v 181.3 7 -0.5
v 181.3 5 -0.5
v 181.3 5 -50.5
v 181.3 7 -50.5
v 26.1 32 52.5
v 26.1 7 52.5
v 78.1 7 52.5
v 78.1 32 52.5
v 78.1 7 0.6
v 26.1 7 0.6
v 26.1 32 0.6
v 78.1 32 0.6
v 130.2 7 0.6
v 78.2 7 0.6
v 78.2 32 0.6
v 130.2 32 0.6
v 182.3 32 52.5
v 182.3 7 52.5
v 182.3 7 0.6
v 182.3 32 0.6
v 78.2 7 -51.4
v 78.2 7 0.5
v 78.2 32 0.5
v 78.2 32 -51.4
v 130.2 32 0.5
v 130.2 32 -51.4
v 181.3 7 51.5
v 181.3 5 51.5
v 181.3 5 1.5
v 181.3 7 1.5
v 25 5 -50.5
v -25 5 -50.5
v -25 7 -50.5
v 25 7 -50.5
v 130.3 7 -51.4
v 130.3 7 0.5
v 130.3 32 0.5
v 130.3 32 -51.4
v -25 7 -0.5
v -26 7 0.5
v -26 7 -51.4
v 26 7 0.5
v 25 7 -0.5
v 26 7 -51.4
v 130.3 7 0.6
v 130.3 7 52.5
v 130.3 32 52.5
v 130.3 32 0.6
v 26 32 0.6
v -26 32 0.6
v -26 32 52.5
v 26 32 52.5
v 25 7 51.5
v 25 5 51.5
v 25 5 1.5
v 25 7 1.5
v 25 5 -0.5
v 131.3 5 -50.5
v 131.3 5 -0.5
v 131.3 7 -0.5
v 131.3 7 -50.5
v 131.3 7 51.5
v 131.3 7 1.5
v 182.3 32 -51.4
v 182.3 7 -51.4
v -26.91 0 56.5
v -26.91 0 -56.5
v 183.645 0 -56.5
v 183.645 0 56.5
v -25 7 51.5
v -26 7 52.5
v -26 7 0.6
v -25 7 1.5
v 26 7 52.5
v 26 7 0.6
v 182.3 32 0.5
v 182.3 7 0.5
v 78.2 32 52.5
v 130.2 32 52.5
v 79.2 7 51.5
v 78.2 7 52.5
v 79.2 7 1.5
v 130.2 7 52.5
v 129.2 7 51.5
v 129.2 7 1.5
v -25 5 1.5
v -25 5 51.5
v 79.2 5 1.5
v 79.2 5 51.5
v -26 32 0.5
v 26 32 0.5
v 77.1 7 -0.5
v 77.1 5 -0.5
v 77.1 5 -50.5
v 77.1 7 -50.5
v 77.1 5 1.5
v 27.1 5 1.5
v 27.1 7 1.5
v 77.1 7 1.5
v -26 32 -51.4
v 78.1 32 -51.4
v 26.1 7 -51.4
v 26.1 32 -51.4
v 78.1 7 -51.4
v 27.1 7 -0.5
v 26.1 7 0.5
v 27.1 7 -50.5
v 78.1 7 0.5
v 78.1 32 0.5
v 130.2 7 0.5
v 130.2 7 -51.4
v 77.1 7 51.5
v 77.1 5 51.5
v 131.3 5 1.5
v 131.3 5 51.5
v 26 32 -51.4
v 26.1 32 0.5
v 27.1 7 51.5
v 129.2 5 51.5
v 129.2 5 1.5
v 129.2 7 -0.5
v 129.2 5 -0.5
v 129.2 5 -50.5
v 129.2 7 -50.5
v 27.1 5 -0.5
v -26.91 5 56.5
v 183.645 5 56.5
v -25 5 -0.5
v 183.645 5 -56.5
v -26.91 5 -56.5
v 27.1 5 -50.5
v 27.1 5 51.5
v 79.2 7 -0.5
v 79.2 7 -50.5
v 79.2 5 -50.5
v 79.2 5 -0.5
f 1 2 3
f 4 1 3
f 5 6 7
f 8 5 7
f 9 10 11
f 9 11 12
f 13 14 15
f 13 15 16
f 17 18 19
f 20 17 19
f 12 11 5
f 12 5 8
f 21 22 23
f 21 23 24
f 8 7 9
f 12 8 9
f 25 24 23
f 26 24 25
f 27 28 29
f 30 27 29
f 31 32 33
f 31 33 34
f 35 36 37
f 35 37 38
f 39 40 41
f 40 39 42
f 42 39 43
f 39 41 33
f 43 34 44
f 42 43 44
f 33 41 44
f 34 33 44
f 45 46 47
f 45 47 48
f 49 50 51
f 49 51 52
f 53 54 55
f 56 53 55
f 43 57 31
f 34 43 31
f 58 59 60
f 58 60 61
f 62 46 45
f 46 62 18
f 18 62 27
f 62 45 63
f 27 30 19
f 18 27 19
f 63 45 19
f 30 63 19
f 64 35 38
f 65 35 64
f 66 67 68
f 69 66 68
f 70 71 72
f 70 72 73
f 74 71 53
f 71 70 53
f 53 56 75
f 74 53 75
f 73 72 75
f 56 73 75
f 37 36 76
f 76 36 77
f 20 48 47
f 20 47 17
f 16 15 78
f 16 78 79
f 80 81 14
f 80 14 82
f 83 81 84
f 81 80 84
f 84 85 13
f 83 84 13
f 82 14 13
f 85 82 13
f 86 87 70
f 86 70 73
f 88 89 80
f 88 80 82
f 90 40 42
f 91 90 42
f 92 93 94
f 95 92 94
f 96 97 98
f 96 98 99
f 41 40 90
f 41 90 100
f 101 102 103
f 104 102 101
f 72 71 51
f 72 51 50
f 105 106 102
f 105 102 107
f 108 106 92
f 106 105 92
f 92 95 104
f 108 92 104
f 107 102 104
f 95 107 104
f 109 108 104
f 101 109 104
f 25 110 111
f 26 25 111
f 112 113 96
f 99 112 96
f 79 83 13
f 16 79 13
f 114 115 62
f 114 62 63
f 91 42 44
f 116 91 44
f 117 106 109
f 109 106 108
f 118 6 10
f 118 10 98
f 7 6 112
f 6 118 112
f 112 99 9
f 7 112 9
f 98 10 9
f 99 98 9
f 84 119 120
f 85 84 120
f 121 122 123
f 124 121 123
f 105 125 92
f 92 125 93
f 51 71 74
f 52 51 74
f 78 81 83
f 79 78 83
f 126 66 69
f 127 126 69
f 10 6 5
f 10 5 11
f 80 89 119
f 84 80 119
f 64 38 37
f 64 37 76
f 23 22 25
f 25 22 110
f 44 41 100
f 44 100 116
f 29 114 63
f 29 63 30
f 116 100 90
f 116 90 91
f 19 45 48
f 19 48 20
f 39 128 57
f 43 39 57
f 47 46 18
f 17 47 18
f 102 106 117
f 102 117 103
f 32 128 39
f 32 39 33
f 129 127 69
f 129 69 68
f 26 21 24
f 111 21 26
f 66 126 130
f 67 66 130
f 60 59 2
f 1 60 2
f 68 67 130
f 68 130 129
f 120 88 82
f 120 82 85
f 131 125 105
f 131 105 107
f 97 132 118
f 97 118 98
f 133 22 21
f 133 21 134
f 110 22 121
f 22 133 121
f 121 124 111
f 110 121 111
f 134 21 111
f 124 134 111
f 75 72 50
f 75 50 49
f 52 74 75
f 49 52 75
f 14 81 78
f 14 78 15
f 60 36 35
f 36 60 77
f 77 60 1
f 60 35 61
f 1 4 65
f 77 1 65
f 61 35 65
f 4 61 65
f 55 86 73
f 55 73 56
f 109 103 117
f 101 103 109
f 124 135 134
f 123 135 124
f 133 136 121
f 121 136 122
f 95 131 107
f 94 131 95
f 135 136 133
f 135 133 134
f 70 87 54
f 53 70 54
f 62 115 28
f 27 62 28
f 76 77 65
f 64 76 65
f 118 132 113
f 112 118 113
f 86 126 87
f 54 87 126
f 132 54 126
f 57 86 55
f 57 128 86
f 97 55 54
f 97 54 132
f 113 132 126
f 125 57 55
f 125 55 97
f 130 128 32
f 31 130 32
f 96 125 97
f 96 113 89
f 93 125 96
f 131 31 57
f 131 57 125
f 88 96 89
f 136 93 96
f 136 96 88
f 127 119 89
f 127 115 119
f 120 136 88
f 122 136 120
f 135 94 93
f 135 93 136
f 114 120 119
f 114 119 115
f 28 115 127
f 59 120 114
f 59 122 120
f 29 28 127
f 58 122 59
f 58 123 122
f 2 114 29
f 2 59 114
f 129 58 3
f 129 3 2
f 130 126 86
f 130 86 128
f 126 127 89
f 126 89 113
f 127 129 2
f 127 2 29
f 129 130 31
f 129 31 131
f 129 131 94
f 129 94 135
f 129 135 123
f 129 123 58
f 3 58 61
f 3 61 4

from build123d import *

# Parameters (mm, degrees)
SKETCH1_W                 = 500
SKETCH1_H                 = 113
BOSS_EXTRUDE1_DEPTH       = 5
SKETCH2_W                 = 50
SKETCH2_H                 = 50
BOSS_EXTRUDE3_DEPTH       = 2
LPATTERN1_COUNT           = 2
LPATTERN1_PITCH           = 52
SKETCH3_W                 = 52
SKETCH3_H                 = 51.9
BOSS_EXTRUDE8_DEPTH       = 25
LPATTERN5_COUNT           = 2
LPATTERN5_PITCH           = 52
LPATTERN6_COUNT           = 4
LPATTERN6_PITCH           = 52.1
LPATTERN6_COPY_1_SKETCH_W = 50
LPATTERN6_COPY_1_SKETCH_H = 50
LPATTERN6_COPY_1_DEPTH    = 2
LPATTERN6_COPY_2_SKETCH_W = 50
LPATTERN6_COPY_2_SKETCH_H = 50
LPATTERN6_COPY_2_DEPTH    = 2
LPATTERN6_COPY_3_SKETCH_W = 50
LPATTERN6_COPY_3_SKETCH_H = 50
LPATTERN6_COPY_3_DEPTH    = 2
LPATTERN6_COPY_4_SKETCH_W = 52
LPATTERN6_COPY_4_SKETCH_H = 51.9
LPATTERN6_COPY_4_DEPTH    = 25
LPATTERN6_COPY_5_SKETCH_W = 52
LPATTERN6_COPY_5_SKETCH_H = 51.9
LPATTERN6_COPY_5_DEPTH    = 25
LPATTERN6_COPY_6_SKETCH_W = 52
LPATTERN6_COPY_6_SKETCH_H = 51.9
LPATTERN6_COPY_6_DEPTH    = 25
SKETCH4_W                 = 223.089941366
SKETCH4_H                 = 113
SKETCH4_W_2               = 66.355147464
CUT_EXTRUDE1_DEPTH        = 10


with BuildPart() as part:
    # Sketch1 → Boss-Extrude1 (new body)
    with BuildSketch(Plane(origin=(0, 0, 0), x_dir=(1, 0, 0), z_dir=(0, 1, 0))):
        Rectangle(SKETCH1_W, SKETCH1_H)
    extrude(amount=BOSS_EXTRUDE1_DEPTH)

    # Sketch2 → Boss-Extrude3 (add)
    with BuildSketch(Plane(origin=(0, 5, 0), x_dir=(1, 0, 0), z_dir=(0, 1, 0))):
        with Locations((0, -26.5)):
            Rectangle(SKETCH2_W, SKETCH2_H)
    boss_extrude3 = extrude(amount=BOSS_EXTRUDE3_DEPTH)

    # LPattern1: Boss-Extrude3 ×2
    with Locations(*[(0, 0, -i * LPATTERN1_PITCH) for i in range(1, LPATTERN1_COUNT)]):
        add(boss_extrude3)

    # Sketch3 → Boss-Extrude8 (add)
    with BuildSketch(Plane(origin=(0, 7, 0), x_dir=(1, 0, 0), z_dir=(0, 1, 0))):
        with Locations((0, -26.55)):
            Rectangle(SKETCH3_W, SKETCH3_H)
    boss_extrude8 = extrude(amount=BOSS_EXTRUDE8_DEPTH)

    # LPattern5: Boss-Extrude8 ×2
    with Locations(*[(0, 0, -i * LPATTERN5_PITCH) for i in range(1, LPATTERN5_COUNT)]):
        add(boss_extrude8)

    # LPattern6: Boss-Extrude3, Boss-Extrude8 ×4
    with Locations(*[(i * LPATTERN6_PITCH, 0, 0) for i in range(1, LPATTERN6_COUNT)]):
        add(boss_extrude3)
        add(boss_extrude8)

    # LPattern6 copy 1 sketch → LPattern6 copy 1 (add)
    with BuildSketch(Plane(origin=(52.1, 5, -52), x_dir=(1, 0, 0), z_dir=(0, 1, 0))):
        with Locations((0, -26.5)):
            Rectangle(LPATTERN6_COPY_1_SKETCH_W, LPATTERN6_COPY_1_SKETCH_H)
    extrude(amount=LPATTERN6_COPY_1_DEPTH)

    # LPattern6 copy 2 sketch → LPattern6 copy 2 (add)
    with BuildSketch(Plane(origin=(104.2, 5, -52), x_dir=(1, 0, 0), z_dir=(0, 1, 0))):
        with Locations((0, -26.5)):
            Rectangle(LPATTERN6_COPY_2_SKETCH_W, LPATTERN6_COPY_2_SKETCH_H)
    extrude(amount=LPATTERN6_COPY_2_DEPTH)

    # LPattern6 copy 3 sketch → LPattern6 copy 3 (add)
    with BuildSketch(Plane(origin=(156.3, 5, -52), x_dir=(1, 0, 0), z_dir=(0, 1, 0))):
        with Locations((0, -26.5)):
            Rectangle(LPATTERN6_COPY_3_SKETCH_W, LPATTERN6_COPY_3_SKETCH_H)
    extrude(amount=LPATTERN6_COPY_3_DEPTH)

    # LPattern6 copy 4 sketch → LPattern6 copy 4 (add)
    with BuildSketch(Plane(origin=(52.1, 7, -52), x_dir=(1, 0, 0), z_dir=(0, 1, 0))):
        with Locations((0, -26.55)):
            Rectangle(LPATTERN6_COPY_4_SKETCH_W, LPATTERN6_COPY_4_SKETCH_H)
    extrude(amount=LPATTERN6_COPY_4_DEPTH)

    # LPattern6 copy 5 sketch → LPattern6 copy 5 (add)
    with BuildSketch(Plane(origin=(104.2, 7, -52), x_dir=(1, 0, 0), z_dir=(0, 1, 0))):
        with Locations((0, -26.55)):
            Rectangle(LPATTERN6_COPY_5_SKETCH_W, LPATTERN6_COPY_5_SKETCH_H)
    extrude(amount=LPATTERN6_COPY_5_DEPTH)

    # LPattern6 copy 6 sketch → LPattern6 copy 6 (add)
    with BuildSketch(Plane(origin=(156.3, 7, -52), x_dir=(1, 0, 0), z_dir=(0, 1, 0))):
        with Locations((0, -26.55)):
            Rectangle(LPATTERN6_COPY_6_SKETCH_W, LPATTERN6_COPY_6_SKETCH_H)
    extrude(amount=LPATTERN6_COPY_6_DEPTH)

    # Sketch4 → Cut-Extrude1 (cut)
    with BuildSketch(Plane(origin=(0, 5, 0), x_dir=(1, 0, 0), z_dir=(0, 1, 0))):
        with Locations((-138.455029317, 0)):
            Rectangle(SKETCH4_W, SKETCH4_H)
        with Locations((216.822426268, 0)):
            Rectangle(SKETCH4_W_2, SKETCH4_H)
    extrude(amount=-CUT_EXTRUDE1_DEPTH, mode=Mode.SUBTRACT)


solid = part.part
